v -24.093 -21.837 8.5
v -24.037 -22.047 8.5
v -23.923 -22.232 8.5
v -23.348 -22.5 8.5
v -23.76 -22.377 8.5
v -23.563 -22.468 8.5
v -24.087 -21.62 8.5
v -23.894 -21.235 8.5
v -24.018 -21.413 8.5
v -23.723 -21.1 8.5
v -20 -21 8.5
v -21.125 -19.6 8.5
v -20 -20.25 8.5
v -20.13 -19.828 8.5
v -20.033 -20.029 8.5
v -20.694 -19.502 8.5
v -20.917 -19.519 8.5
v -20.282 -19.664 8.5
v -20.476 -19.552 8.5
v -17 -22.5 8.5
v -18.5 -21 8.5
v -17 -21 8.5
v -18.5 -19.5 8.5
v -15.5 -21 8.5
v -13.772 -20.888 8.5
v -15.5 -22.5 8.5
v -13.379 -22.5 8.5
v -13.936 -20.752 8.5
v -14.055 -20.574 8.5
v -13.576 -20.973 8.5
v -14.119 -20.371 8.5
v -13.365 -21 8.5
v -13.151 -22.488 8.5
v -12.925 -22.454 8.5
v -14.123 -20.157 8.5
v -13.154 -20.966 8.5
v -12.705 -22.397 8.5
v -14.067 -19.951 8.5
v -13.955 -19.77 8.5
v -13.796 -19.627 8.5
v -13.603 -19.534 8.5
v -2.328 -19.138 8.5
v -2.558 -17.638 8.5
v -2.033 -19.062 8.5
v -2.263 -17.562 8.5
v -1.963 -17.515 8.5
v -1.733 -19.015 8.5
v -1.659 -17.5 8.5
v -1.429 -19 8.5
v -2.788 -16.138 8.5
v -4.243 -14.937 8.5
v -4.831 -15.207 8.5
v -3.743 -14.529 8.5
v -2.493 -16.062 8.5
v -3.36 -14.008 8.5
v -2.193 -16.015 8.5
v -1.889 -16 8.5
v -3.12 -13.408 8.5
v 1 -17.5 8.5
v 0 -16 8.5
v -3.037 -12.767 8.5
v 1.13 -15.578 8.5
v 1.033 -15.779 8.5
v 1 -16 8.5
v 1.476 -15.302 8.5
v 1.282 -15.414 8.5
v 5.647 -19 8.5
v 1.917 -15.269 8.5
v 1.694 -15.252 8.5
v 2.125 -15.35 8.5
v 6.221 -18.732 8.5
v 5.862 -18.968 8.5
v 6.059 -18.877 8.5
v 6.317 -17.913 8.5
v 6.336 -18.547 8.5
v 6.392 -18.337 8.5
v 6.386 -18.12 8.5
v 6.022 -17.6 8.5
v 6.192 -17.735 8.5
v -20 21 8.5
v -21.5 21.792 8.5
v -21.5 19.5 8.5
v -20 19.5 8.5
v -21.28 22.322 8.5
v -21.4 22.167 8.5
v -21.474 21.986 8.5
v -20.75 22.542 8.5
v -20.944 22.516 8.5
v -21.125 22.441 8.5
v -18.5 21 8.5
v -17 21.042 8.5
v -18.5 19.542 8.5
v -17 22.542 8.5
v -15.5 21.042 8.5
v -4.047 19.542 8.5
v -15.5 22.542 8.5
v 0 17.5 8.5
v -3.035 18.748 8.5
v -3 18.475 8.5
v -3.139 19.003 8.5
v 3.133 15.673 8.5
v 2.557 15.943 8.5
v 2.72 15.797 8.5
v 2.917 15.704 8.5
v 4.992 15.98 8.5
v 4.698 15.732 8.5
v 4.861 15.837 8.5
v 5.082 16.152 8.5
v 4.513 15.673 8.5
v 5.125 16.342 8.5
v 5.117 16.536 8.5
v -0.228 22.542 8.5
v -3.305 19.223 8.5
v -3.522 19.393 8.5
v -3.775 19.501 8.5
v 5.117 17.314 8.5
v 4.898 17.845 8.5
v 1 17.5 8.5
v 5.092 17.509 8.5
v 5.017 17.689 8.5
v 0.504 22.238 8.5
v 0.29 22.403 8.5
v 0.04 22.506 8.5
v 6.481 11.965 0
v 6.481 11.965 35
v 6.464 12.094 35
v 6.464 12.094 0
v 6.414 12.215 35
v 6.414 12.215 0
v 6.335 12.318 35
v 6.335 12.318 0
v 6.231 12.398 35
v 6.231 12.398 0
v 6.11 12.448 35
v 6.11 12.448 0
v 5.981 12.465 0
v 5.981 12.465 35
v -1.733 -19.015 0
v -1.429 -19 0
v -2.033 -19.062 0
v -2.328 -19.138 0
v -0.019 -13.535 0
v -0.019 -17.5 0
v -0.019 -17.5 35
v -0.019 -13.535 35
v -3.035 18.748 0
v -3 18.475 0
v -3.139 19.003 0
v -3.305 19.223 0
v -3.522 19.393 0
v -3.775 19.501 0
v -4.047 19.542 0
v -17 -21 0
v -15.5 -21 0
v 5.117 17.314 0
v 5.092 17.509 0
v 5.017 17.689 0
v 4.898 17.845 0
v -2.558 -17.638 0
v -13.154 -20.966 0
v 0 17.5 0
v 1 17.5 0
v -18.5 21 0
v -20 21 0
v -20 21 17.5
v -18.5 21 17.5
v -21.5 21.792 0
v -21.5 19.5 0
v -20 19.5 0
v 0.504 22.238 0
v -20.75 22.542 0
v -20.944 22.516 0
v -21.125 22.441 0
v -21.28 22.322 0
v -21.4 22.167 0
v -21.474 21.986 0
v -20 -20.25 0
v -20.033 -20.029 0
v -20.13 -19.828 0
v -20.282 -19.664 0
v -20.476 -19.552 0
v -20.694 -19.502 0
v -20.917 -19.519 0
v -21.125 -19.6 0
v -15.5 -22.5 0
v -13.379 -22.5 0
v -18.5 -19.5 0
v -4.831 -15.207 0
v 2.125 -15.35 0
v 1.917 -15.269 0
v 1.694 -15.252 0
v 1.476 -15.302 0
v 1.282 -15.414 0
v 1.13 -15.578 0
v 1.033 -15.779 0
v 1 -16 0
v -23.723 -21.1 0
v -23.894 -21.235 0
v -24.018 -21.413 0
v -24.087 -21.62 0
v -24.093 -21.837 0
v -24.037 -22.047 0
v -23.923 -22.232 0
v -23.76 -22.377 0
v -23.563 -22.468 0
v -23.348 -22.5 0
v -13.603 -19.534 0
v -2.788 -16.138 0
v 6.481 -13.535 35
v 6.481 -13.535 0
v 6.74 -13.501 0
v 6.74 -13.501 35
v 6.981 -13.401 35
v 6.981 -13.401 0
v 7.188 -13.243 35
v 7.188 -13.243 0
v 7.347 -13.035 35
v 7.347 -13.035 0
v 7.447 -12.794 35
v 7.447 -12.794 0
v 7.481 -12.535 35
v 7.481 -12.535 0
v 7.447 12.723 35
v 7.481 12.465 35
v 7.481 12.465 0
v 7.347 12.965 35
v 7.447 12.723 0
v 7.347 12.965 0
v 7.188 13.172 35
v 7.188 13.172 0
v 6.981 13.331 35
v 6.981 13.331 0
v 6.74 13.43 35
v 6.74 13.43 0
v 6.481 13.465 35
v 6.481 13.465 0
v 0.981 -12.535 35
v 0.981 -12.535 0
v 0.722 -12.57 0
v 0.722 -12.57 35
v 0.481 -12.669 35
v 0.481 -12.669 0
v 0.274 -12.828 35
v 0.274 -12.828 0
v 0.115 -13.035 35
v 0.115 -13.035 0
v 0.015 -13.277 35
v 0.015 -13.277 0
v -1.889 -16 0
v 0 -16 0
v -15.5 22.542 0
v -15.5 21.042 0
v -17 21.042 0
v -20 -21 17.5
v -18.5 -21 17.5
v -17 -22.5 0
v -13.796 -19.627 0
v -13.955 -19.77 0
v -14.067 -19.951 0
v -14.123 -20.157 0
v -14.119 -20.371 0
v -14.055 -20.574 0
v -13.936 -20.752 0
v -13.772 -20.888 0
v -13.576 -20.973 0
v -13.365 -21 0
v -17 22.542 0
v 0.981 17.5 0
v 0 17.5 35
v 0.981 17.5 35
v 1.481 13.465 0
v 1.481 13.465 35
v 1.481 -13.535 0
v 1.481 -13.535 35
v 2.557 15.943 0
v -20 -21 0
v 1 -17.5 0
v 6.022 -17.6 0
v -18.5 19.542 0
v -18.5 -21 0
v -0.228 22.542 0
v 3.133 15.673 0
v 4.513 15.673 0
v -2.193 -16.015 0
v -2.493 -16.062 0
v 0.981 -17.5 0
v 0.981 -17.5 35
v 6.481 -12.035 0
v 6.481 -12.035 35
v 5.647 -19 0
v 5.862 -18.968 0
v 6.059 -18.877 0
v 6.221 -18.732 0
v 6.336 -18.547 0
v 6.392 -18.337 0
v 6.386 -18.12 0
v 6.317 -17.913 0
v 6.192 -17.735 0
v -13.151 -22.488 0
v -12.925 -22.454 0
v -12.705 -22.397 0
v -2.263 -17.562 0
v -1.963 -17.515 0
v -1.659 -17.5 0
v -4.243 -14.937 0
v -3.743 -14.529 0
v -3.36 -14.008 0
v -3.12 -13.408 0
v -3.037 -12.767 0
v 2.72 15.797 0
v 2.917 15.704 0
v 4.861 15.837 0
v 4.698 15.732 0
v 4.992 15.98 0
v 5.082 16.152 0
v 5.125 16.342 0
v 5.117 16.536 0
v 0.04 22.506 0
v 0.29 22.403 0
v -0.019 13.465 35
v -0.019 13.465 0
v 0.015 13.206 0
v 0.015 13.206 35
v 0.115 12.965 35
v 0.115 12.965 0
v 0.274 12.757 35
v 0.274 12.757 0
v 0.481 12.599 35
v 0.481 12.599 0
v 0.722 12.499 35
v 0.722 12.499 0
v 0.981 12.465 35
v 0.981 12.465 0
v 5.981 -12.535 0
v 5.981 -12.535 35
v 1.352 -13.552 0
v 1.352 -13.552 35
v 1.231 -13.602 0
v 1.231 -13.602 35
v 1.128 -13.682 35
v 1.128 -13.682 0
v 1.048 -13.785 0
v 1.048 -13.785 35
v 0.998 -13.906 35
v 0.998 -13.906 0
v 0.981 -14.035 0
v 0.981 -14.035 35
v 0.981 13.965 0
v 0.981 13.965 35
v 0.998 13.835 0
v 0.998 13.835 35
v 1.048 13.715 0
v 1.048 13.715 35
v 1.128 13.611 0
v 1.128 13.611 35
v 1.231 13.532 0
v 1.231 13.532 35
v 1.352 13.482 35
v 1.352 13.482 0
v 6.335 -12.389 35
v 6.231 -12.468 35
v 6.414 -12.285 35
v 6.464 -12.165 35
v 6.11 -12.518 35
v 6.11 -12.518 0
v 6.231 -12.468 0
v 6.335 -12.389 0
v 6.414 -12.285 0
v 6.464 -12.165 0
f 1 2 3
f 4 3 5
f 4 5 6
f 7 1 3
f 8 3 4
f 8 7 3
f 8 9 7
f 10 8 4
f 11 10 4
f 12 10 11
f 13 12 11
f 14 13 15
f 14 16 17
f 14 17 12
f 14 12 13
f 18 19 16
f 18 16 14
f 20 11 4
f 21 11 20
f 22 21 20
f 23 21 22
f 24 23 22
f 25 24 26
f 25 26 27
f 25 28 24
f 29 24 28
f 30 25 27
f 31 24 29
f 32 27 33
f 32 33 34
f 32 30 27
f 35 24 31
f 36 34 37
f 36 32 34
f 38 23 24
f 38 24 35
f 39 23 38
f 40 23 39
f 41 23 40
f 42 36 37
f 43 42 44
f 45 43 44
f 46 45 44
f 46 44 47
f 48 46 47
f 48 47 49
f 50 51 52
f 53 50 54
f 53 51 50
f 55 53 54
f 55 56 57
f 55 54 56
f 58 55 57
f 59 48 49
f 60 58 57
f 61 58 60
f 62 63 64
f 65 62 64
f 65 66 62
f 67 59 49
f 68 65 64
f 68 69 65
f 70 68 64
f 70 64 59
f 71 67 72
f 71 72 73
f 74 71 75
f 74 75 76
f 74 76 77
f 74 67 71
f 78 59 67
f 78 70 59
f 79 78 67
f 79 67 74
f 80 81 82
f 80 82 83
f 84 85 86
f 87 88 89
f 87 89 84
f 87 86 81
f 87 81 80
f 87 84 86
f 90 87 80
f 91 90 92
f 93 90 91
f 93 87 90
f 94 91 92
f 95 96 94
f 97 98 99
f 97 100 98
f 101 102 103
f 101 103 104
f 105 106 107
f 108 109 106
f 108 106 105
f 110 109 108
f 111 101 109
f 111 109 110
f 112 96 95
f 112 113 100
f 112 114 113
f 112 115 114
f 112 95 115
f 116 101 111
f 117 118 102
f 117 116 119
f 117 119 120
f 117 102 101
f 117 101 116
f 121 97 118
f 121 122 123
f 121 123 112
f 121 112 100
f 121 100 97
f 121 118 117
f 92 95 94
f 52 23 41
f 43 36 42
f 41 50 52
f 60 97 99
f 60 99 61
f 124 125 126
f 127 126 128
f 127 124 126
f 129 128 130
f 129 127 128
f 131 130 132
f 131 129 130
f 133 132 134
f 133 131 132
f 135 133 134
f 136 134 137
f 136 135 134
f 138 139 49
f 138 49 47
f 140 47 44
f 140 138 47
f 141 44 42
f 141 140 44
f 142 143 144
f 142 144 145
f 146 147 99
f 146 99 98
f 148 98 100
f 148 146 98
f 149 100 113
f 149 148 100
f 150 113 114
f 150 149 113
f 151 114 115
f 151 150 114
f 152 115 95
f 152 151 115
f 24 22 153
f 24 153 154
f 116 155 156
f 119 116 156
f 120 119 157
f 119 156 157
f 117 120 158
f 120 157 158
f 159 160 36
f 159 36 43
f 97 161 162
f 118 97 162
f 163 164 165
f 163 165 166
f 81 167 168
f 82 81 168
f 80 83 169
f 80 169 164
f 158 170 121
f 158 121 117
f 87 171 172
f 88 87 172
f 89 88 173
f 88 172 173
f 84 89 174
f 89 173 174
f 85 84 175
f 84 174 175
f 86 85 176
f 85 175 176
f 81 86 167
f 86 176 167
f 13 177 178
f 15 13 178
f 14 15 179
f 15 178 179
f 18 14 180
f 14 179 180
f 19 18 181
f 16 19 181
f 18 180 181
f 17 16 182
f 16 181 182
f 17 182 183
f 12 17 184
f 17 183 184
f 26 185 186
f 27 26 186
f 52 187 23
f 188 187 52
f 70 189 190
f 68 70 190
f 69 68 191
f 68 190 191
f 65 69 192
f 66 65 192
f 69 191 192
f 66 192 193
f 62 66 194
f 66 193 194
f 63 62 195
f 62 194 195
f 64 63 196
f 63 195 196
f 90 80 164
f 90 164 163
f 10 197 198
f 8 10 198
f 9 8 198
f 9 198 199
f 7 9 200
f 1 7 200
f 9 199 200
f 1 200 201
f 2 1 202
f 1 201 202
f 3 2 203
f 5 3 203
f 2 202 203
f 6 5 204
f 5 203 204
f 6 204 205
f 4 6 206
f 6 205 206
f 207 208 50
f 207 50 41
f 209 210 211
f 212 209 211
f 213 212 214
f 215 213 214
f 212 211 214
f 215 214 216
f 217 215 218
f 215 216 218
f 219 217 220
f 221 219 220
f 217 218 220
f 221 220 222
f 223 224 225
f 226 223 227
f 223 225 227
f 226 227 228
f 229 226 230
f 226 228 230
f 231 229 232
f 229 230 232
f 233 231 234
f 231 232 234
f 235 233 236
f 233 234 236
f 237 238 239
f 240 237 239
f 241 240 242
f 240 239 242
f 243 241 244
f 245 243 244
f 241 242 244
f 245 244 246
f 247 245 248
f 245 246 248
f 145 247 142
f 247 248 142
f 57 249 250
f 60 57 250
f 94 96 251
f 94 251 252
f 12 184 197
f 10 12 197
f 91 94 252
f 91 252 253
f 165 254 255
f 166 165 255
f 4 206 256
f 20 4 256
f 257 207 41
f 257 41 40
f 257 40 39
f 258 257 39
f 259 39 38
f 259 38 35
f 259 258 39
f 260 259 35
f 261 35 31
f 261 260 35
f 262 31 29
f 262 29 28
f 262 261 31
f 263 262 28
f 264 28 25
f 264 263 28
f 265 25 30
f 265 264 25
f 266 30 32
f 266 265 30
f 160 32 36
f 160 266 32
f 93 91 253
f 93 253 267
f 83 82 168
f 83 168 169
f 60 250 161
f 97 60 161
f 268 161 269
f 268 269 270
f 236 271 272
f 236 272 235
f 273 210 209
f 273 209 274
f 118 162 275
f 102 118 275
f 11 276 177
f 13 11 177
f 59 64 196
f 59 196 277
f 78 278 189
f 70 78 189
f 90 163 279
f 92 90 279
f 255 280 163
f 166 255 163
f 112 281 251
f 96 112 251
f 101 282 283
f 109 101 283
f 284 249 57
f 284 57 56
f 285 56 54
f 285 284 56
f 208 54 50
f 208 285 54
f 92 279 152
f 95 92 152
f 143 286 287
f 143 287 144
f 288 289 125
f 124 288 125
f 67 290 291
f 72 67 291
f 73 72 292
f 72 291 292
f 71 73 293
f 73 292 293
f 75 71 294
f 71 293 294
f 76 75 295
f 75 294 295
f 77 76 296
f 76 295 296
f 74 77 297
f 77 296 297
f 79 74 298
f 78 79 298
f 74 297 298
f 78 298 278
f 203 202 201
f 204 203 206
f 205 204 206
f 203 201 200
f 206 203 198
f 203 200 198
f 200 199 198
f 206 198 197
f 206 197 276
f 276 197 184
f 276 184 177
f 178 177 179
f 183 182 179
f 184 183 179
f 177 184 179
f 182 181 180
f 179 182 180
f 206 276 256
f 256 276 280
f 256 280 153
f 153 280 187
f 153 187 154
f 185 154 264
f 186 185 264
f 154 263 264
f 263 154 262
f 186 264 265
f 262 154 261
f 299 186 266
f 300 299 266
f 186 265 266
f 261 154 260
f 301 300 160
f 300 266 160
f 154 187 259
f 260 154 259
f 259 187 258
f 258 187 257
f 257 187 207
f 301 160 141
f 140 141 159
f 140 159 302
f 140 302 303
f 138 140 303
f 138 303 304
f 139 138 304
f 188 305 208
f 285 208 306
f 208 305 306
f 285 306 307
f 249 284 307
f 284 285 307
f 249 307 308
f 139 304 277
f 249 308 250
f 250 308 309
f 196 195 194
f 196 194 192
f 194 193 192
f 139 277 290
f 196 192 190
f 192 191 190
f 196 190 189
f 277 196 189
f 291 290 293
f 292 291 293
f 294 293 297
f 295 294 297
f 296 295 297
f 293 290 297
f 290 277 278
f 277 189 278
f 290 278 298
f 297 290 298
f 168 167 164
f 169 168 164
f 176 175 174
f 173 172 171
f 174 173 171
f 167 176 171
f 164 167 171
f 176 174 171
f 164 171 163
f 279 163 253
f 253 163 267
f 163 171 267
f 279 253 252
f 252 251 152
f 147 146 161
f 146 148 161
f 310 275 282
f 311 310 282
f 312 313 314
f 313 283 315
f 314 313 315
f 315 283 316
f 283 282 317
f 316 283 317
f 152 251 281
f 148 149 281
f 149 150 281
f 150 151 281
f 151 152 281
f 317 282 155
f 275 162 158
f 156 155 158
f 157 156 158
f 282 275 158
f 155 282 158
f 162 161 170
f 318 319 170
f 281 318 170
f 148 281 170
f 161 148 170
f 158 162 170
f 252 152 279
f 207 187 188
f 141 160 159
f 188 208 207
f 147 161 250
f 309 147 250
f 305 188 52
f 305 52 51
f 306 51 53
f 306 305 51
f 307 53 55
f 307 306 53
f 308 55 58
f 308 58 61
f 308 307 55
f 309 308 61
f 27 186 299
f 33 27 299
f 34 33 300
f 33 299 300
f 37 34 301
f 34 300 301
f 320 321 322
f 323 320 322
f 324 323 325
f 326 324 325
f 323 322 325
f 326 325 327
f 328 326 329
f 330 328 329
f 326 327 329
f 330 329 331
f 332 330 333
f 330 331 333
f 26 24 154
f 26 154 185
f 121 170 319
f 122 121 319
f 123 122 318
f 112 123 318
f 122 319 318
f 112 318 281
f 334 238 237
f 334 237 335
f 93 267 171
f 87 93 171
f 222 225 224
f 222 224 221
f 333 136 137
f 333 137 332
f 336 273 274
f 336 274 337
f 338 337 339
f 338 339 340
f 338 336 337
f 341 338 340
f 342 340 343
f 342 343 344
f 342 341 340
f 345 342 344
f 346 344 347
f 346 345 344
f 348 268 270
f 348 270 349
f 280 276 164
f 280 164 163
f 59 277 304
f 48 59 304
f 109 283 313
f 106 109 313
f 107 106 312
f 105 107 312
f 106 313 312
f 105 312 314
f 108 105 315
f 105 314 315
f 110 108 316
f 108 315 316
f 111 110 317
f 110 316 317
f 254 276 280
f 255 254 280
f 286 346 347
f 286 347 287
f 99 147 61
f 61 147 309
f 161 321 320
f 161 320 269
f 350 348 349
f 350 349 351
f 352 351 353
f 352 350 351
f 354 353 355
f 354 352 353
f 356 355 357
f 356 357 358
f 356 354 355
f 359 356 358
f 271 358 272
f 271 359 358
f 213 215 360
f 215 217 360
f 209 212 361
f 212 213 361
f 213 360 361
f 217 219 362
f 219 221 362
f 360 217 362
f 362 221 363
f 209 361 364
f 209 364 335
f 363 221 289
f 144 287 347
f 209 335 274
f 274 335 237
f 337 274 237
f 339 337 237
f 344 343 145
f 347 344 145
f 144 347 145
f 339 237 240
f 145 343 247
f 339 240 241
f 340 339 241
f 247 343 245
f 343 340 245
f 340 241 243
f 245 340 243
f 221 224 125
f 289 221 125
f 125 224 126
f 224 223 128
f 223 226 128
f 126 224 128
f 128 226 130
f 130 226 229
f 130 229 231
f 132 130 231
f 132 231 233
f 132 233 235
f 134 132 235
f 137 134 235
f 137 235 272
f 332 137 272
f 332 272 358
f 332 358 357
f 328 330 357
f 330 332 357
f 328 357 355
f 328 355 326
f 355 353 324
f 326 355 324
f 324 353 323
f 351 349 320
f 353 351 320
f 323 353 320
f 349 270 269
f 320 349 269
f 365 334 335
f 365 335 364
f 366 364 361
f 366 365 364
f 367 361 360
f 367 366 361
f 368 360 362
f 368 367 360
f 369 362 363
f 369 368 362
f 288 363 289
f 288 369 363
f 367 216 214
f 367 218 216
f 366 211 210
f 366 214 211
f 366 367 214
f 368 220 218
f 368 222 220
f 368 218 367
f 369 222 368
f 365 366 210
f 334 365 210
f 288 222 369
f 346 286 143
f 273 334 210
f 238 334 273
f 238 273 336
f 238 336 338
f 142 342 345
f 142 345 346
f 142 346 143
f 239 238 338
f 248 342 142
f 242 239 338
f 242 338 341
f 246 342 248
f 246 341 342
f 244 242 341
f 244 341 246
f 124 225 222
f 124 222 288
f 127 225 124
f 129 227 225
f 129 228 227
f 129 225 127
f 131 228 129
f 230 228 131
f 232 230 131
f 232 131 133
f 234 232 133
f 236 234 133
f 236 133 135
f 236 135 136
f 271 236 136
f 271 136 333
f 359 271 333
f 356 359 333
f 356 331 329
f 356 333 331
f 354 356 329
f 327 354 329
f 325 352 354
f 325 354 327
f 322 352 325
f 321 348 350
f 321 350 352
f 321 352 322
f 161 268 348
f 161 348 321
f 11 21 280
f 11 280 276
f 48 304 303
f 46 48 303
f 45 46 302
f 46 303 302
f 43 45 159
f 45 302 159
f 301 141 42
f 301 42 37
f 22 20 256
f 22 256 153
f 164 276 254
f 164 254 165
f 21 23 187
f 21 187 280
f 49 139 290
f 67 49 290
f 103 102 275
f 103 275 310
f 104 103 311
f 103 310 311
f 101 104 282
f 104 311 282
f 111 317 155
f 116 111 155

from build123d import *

# Parameters (mm, degrees)
PAD001_DEPTH = 35
PAD_DEPTH    = 8.5
BOX_W        = 1.5
BOX_H        = 42
BOX_DEPTH    = 17.5


with BuildPart() as din_rail:
    # Sketch001 → Pad001 (new body)
    with BuildSketch(Plane(origin=(0, 17.5, 0), x_dir=(1, 0, 0), z_dir=(0, 0, 1))):
        with BuildLine():
            Line((0, 0), (0.981065, 0))
            Line((0.981065, 0), (0.981065, -3.535445))
            ThreePointArc((0.981065, -3.535445), (1.127512, -3.888998), (1.481065, -4.035445))
            Line((1.481065, -4.035445), (6.481065, -4.035445))
            ThreePointArc((7.481065, -5.035445), (7.188172, -4.328338), (6.481065, -4.035445))
            Line((7.481065, -5.035445), (7.481065, -30.035445))
            ThreePointArc((6.481065, -31.035445), (7.188172, -30.742552), (7.481065, -30.035445))
            Line((6.481065, -31.035445), (1.481065, -31.035445))
            ThreePointArc((1.481065, -31.035445), (1.127512, -31.181892), (0.981065, -31.535445))
            Line((0.981065, -31.535445), (0.981065, -35))
            Line((0.981065, -35), (-0.018935, -35))
            Line((-0.018935, -35), (-0.018935, -31.035445))
            ThreePointArc((0.981065, -30.035445), (0.273958, -30.328338), (-0.018935, -31.035445))
            Line((0.981065, -30.035445), (5.981065, -30.035445))
            ThreePointArc((5.981065, -30.035445), (6.334618, -29.888998), (6.481065, -29.535445))
            Line((6.481065, -29.535445), (6.481065, -5.535445))
            ThreePointArc((6.481065, -5.535445), (6.334618, -5.181892), (5.981065, -5.035445))
            Line((5.981065, -5.035445), (0.981065, -5.035445))
            ThreePointArc((-0.018935, -4.035445), (0.273958, -4.742552), (0.981065, -5.035445))
            Line((-0.018935, -4.035445), (0, 0))
        make_face()
    extrude(amount=PAD001_DEPTH)


with BuildPart() as din_bracket_half:
    # Sketch → Pad (new body)
    with BuildSketch(Plane(origin=(-3, 0, 0), x_dir=(1, 0, 0), z_dir=(0, 0, 1))):
        with BuildLine():
            Line((2.771987, 22.541663), (-12.5, 22.541663))
            Line((-12.5, 22.541663), (-12.5, 21.041663))
            Line((-12.5, 21.041663), (-14, 21.041663))
            Line((-14, 21.041663), (-14, 22.541663))
            Line((-14, 22.541663), (-17.75, 22.541663))
            ThreePointArc((-17.75, 22.541663), (-18.28033, 22.321993), (-18.5, 21.791663))
            Line((-18.5, 21.791663), (-18.5, 19.5))
            Line((-18.5, 19.5), (-17, 19.5))
            Line((-17, 19.5), (-17, 21))
            Line((-17, 21), (-15.5, 21))
            Line((-15.5, 21), (-15.5, 19.541663))
            Line((-15.5, 19.541663), (-1.047056, 19.541663))
            ThreePointArc((0, 18.474809), (-0.305125, 19.222587), (-1.047056, 19.541663))
            Line((0, 18.474809), (-0.037298, -12.767241))
            ThreePointArc((-1.830702, -15.207168), (-0.534684, -14.280711), (-0.037298, -12.767241))
            Line((-15.5, -19.5), (-1.830702, -15.207168))
            Line((-15.5, -19.5), (-15.5, -21))
            Line((-15.5, -21), (-17, -21))
            Line((-17, -21), (-17, -20.25))
            ThreePointArc((-17, -20.25), (-17.375, -19.600481), (-18.125, -19.600481))
            Line((-18.125, -19.600481), (-20.723075, -21.100481))
            ThreePointArc((-20.723075, -21.100481), (-21.072519, -21.944114), (-20.348075, -22.5))
            Line((-20.348075, -22.5), (-14, -22.5))
            Line((-14, -22.5), (-14, -21))
            Line((-14, -21), (-12.5, -21))
            Line((-12.5, -21), (-12.5, -22.5))
            Line((-12.5, -22.5), (-10.37868, -22.5))
            ThreePointArc((-10.37868, -22.5), (-10.037666, -22.474008), (-9.704532, -22.396631))
            Line((0.672204, -19.137825), (-9.704532, -22.396631))
            ThreePointArc((1.571068, -19), (1.116383, -19.034657), (0.672204, -19.137825))
            Line((1.571068, -19), (8.646899, -19))
            ThreePointArc((8.646899, -19), (9.371343, -18.444114), (9.021899, -17.600481))
            Line((9.021899, -17.600481), (5.124786, -15.350481))
            ThreePointArc((5.124786, -15.350481), (4.374786, -15.350481), (3.999786, -16))
            Line((3.999786, -16), (3.999786, -17.5))
            Line((3.999786, -17.5), (1.341069, -17.5))
            ThreePointArc((1.341069, -17.5), (0.886384, -17.534657), (0.442205, -17.637825))
            Line((-10.153969, -20.965545), (0.442205, -17.637825))
            ThreePointArc((-10.6034, -19.534458), (-11.094223, -20.474716), (-10.153969, -20.965545))
            Line((0.212206, -16.137825), (-10.6034, -19.534458))
            ThreePointArc((1.111069, -16), (0.656385, -16.034657), (0.212206, -16.137825))
            Line((1.111069, -16), (2.999786, -16))
            Line((2.999786, -16), (2.999786, 17.5))
            Line((2.999786, 17.5), (3.999786, 17.5))
            Line((3.999786, 17.5), (5.556936, 15.942849))
            ThreePointArc((5.556936, 15.942849), (5.815061, 15.743569), (6.133362, 15.672675))
            Line((6.133362, 15.672675), (7.513396, 15.672675))
            ThreePointArc((7.513396, 15.672675), (7.992308, 15.980285), (8.11731, 16.535582))
            Line((8.11731, 16.535582), (8.11731, 17.314455))
            ThreePointArc((8.11731, 17.314455), (8.06022, 17.601467), (7.897641, 17.844785))
            Line((3.50396, 22.23847), (7.897641, 17.844785))
            ThreePointArc((3.50396, 22.23847), (3.168128, 22.462866), (2.771987, 22.541663))
        make_face()
    extrude(amount=PAD_DEPTH)


with BuildPart() as pcb:
    # Box → Box (new body)
    with BuildSketch(Plane(origin=(-20, -21, 0), x_dir=(1, 0, 0), z_dir=(0, 0, 1))):
        with Locations((0.75, 21)):
            Rectangle(BOX_W, BOX_H)
    extrude(amount=BOX_DEPTH)


solid = Compound([din_rail.part, din_bracket_half.part, pcb.part])
